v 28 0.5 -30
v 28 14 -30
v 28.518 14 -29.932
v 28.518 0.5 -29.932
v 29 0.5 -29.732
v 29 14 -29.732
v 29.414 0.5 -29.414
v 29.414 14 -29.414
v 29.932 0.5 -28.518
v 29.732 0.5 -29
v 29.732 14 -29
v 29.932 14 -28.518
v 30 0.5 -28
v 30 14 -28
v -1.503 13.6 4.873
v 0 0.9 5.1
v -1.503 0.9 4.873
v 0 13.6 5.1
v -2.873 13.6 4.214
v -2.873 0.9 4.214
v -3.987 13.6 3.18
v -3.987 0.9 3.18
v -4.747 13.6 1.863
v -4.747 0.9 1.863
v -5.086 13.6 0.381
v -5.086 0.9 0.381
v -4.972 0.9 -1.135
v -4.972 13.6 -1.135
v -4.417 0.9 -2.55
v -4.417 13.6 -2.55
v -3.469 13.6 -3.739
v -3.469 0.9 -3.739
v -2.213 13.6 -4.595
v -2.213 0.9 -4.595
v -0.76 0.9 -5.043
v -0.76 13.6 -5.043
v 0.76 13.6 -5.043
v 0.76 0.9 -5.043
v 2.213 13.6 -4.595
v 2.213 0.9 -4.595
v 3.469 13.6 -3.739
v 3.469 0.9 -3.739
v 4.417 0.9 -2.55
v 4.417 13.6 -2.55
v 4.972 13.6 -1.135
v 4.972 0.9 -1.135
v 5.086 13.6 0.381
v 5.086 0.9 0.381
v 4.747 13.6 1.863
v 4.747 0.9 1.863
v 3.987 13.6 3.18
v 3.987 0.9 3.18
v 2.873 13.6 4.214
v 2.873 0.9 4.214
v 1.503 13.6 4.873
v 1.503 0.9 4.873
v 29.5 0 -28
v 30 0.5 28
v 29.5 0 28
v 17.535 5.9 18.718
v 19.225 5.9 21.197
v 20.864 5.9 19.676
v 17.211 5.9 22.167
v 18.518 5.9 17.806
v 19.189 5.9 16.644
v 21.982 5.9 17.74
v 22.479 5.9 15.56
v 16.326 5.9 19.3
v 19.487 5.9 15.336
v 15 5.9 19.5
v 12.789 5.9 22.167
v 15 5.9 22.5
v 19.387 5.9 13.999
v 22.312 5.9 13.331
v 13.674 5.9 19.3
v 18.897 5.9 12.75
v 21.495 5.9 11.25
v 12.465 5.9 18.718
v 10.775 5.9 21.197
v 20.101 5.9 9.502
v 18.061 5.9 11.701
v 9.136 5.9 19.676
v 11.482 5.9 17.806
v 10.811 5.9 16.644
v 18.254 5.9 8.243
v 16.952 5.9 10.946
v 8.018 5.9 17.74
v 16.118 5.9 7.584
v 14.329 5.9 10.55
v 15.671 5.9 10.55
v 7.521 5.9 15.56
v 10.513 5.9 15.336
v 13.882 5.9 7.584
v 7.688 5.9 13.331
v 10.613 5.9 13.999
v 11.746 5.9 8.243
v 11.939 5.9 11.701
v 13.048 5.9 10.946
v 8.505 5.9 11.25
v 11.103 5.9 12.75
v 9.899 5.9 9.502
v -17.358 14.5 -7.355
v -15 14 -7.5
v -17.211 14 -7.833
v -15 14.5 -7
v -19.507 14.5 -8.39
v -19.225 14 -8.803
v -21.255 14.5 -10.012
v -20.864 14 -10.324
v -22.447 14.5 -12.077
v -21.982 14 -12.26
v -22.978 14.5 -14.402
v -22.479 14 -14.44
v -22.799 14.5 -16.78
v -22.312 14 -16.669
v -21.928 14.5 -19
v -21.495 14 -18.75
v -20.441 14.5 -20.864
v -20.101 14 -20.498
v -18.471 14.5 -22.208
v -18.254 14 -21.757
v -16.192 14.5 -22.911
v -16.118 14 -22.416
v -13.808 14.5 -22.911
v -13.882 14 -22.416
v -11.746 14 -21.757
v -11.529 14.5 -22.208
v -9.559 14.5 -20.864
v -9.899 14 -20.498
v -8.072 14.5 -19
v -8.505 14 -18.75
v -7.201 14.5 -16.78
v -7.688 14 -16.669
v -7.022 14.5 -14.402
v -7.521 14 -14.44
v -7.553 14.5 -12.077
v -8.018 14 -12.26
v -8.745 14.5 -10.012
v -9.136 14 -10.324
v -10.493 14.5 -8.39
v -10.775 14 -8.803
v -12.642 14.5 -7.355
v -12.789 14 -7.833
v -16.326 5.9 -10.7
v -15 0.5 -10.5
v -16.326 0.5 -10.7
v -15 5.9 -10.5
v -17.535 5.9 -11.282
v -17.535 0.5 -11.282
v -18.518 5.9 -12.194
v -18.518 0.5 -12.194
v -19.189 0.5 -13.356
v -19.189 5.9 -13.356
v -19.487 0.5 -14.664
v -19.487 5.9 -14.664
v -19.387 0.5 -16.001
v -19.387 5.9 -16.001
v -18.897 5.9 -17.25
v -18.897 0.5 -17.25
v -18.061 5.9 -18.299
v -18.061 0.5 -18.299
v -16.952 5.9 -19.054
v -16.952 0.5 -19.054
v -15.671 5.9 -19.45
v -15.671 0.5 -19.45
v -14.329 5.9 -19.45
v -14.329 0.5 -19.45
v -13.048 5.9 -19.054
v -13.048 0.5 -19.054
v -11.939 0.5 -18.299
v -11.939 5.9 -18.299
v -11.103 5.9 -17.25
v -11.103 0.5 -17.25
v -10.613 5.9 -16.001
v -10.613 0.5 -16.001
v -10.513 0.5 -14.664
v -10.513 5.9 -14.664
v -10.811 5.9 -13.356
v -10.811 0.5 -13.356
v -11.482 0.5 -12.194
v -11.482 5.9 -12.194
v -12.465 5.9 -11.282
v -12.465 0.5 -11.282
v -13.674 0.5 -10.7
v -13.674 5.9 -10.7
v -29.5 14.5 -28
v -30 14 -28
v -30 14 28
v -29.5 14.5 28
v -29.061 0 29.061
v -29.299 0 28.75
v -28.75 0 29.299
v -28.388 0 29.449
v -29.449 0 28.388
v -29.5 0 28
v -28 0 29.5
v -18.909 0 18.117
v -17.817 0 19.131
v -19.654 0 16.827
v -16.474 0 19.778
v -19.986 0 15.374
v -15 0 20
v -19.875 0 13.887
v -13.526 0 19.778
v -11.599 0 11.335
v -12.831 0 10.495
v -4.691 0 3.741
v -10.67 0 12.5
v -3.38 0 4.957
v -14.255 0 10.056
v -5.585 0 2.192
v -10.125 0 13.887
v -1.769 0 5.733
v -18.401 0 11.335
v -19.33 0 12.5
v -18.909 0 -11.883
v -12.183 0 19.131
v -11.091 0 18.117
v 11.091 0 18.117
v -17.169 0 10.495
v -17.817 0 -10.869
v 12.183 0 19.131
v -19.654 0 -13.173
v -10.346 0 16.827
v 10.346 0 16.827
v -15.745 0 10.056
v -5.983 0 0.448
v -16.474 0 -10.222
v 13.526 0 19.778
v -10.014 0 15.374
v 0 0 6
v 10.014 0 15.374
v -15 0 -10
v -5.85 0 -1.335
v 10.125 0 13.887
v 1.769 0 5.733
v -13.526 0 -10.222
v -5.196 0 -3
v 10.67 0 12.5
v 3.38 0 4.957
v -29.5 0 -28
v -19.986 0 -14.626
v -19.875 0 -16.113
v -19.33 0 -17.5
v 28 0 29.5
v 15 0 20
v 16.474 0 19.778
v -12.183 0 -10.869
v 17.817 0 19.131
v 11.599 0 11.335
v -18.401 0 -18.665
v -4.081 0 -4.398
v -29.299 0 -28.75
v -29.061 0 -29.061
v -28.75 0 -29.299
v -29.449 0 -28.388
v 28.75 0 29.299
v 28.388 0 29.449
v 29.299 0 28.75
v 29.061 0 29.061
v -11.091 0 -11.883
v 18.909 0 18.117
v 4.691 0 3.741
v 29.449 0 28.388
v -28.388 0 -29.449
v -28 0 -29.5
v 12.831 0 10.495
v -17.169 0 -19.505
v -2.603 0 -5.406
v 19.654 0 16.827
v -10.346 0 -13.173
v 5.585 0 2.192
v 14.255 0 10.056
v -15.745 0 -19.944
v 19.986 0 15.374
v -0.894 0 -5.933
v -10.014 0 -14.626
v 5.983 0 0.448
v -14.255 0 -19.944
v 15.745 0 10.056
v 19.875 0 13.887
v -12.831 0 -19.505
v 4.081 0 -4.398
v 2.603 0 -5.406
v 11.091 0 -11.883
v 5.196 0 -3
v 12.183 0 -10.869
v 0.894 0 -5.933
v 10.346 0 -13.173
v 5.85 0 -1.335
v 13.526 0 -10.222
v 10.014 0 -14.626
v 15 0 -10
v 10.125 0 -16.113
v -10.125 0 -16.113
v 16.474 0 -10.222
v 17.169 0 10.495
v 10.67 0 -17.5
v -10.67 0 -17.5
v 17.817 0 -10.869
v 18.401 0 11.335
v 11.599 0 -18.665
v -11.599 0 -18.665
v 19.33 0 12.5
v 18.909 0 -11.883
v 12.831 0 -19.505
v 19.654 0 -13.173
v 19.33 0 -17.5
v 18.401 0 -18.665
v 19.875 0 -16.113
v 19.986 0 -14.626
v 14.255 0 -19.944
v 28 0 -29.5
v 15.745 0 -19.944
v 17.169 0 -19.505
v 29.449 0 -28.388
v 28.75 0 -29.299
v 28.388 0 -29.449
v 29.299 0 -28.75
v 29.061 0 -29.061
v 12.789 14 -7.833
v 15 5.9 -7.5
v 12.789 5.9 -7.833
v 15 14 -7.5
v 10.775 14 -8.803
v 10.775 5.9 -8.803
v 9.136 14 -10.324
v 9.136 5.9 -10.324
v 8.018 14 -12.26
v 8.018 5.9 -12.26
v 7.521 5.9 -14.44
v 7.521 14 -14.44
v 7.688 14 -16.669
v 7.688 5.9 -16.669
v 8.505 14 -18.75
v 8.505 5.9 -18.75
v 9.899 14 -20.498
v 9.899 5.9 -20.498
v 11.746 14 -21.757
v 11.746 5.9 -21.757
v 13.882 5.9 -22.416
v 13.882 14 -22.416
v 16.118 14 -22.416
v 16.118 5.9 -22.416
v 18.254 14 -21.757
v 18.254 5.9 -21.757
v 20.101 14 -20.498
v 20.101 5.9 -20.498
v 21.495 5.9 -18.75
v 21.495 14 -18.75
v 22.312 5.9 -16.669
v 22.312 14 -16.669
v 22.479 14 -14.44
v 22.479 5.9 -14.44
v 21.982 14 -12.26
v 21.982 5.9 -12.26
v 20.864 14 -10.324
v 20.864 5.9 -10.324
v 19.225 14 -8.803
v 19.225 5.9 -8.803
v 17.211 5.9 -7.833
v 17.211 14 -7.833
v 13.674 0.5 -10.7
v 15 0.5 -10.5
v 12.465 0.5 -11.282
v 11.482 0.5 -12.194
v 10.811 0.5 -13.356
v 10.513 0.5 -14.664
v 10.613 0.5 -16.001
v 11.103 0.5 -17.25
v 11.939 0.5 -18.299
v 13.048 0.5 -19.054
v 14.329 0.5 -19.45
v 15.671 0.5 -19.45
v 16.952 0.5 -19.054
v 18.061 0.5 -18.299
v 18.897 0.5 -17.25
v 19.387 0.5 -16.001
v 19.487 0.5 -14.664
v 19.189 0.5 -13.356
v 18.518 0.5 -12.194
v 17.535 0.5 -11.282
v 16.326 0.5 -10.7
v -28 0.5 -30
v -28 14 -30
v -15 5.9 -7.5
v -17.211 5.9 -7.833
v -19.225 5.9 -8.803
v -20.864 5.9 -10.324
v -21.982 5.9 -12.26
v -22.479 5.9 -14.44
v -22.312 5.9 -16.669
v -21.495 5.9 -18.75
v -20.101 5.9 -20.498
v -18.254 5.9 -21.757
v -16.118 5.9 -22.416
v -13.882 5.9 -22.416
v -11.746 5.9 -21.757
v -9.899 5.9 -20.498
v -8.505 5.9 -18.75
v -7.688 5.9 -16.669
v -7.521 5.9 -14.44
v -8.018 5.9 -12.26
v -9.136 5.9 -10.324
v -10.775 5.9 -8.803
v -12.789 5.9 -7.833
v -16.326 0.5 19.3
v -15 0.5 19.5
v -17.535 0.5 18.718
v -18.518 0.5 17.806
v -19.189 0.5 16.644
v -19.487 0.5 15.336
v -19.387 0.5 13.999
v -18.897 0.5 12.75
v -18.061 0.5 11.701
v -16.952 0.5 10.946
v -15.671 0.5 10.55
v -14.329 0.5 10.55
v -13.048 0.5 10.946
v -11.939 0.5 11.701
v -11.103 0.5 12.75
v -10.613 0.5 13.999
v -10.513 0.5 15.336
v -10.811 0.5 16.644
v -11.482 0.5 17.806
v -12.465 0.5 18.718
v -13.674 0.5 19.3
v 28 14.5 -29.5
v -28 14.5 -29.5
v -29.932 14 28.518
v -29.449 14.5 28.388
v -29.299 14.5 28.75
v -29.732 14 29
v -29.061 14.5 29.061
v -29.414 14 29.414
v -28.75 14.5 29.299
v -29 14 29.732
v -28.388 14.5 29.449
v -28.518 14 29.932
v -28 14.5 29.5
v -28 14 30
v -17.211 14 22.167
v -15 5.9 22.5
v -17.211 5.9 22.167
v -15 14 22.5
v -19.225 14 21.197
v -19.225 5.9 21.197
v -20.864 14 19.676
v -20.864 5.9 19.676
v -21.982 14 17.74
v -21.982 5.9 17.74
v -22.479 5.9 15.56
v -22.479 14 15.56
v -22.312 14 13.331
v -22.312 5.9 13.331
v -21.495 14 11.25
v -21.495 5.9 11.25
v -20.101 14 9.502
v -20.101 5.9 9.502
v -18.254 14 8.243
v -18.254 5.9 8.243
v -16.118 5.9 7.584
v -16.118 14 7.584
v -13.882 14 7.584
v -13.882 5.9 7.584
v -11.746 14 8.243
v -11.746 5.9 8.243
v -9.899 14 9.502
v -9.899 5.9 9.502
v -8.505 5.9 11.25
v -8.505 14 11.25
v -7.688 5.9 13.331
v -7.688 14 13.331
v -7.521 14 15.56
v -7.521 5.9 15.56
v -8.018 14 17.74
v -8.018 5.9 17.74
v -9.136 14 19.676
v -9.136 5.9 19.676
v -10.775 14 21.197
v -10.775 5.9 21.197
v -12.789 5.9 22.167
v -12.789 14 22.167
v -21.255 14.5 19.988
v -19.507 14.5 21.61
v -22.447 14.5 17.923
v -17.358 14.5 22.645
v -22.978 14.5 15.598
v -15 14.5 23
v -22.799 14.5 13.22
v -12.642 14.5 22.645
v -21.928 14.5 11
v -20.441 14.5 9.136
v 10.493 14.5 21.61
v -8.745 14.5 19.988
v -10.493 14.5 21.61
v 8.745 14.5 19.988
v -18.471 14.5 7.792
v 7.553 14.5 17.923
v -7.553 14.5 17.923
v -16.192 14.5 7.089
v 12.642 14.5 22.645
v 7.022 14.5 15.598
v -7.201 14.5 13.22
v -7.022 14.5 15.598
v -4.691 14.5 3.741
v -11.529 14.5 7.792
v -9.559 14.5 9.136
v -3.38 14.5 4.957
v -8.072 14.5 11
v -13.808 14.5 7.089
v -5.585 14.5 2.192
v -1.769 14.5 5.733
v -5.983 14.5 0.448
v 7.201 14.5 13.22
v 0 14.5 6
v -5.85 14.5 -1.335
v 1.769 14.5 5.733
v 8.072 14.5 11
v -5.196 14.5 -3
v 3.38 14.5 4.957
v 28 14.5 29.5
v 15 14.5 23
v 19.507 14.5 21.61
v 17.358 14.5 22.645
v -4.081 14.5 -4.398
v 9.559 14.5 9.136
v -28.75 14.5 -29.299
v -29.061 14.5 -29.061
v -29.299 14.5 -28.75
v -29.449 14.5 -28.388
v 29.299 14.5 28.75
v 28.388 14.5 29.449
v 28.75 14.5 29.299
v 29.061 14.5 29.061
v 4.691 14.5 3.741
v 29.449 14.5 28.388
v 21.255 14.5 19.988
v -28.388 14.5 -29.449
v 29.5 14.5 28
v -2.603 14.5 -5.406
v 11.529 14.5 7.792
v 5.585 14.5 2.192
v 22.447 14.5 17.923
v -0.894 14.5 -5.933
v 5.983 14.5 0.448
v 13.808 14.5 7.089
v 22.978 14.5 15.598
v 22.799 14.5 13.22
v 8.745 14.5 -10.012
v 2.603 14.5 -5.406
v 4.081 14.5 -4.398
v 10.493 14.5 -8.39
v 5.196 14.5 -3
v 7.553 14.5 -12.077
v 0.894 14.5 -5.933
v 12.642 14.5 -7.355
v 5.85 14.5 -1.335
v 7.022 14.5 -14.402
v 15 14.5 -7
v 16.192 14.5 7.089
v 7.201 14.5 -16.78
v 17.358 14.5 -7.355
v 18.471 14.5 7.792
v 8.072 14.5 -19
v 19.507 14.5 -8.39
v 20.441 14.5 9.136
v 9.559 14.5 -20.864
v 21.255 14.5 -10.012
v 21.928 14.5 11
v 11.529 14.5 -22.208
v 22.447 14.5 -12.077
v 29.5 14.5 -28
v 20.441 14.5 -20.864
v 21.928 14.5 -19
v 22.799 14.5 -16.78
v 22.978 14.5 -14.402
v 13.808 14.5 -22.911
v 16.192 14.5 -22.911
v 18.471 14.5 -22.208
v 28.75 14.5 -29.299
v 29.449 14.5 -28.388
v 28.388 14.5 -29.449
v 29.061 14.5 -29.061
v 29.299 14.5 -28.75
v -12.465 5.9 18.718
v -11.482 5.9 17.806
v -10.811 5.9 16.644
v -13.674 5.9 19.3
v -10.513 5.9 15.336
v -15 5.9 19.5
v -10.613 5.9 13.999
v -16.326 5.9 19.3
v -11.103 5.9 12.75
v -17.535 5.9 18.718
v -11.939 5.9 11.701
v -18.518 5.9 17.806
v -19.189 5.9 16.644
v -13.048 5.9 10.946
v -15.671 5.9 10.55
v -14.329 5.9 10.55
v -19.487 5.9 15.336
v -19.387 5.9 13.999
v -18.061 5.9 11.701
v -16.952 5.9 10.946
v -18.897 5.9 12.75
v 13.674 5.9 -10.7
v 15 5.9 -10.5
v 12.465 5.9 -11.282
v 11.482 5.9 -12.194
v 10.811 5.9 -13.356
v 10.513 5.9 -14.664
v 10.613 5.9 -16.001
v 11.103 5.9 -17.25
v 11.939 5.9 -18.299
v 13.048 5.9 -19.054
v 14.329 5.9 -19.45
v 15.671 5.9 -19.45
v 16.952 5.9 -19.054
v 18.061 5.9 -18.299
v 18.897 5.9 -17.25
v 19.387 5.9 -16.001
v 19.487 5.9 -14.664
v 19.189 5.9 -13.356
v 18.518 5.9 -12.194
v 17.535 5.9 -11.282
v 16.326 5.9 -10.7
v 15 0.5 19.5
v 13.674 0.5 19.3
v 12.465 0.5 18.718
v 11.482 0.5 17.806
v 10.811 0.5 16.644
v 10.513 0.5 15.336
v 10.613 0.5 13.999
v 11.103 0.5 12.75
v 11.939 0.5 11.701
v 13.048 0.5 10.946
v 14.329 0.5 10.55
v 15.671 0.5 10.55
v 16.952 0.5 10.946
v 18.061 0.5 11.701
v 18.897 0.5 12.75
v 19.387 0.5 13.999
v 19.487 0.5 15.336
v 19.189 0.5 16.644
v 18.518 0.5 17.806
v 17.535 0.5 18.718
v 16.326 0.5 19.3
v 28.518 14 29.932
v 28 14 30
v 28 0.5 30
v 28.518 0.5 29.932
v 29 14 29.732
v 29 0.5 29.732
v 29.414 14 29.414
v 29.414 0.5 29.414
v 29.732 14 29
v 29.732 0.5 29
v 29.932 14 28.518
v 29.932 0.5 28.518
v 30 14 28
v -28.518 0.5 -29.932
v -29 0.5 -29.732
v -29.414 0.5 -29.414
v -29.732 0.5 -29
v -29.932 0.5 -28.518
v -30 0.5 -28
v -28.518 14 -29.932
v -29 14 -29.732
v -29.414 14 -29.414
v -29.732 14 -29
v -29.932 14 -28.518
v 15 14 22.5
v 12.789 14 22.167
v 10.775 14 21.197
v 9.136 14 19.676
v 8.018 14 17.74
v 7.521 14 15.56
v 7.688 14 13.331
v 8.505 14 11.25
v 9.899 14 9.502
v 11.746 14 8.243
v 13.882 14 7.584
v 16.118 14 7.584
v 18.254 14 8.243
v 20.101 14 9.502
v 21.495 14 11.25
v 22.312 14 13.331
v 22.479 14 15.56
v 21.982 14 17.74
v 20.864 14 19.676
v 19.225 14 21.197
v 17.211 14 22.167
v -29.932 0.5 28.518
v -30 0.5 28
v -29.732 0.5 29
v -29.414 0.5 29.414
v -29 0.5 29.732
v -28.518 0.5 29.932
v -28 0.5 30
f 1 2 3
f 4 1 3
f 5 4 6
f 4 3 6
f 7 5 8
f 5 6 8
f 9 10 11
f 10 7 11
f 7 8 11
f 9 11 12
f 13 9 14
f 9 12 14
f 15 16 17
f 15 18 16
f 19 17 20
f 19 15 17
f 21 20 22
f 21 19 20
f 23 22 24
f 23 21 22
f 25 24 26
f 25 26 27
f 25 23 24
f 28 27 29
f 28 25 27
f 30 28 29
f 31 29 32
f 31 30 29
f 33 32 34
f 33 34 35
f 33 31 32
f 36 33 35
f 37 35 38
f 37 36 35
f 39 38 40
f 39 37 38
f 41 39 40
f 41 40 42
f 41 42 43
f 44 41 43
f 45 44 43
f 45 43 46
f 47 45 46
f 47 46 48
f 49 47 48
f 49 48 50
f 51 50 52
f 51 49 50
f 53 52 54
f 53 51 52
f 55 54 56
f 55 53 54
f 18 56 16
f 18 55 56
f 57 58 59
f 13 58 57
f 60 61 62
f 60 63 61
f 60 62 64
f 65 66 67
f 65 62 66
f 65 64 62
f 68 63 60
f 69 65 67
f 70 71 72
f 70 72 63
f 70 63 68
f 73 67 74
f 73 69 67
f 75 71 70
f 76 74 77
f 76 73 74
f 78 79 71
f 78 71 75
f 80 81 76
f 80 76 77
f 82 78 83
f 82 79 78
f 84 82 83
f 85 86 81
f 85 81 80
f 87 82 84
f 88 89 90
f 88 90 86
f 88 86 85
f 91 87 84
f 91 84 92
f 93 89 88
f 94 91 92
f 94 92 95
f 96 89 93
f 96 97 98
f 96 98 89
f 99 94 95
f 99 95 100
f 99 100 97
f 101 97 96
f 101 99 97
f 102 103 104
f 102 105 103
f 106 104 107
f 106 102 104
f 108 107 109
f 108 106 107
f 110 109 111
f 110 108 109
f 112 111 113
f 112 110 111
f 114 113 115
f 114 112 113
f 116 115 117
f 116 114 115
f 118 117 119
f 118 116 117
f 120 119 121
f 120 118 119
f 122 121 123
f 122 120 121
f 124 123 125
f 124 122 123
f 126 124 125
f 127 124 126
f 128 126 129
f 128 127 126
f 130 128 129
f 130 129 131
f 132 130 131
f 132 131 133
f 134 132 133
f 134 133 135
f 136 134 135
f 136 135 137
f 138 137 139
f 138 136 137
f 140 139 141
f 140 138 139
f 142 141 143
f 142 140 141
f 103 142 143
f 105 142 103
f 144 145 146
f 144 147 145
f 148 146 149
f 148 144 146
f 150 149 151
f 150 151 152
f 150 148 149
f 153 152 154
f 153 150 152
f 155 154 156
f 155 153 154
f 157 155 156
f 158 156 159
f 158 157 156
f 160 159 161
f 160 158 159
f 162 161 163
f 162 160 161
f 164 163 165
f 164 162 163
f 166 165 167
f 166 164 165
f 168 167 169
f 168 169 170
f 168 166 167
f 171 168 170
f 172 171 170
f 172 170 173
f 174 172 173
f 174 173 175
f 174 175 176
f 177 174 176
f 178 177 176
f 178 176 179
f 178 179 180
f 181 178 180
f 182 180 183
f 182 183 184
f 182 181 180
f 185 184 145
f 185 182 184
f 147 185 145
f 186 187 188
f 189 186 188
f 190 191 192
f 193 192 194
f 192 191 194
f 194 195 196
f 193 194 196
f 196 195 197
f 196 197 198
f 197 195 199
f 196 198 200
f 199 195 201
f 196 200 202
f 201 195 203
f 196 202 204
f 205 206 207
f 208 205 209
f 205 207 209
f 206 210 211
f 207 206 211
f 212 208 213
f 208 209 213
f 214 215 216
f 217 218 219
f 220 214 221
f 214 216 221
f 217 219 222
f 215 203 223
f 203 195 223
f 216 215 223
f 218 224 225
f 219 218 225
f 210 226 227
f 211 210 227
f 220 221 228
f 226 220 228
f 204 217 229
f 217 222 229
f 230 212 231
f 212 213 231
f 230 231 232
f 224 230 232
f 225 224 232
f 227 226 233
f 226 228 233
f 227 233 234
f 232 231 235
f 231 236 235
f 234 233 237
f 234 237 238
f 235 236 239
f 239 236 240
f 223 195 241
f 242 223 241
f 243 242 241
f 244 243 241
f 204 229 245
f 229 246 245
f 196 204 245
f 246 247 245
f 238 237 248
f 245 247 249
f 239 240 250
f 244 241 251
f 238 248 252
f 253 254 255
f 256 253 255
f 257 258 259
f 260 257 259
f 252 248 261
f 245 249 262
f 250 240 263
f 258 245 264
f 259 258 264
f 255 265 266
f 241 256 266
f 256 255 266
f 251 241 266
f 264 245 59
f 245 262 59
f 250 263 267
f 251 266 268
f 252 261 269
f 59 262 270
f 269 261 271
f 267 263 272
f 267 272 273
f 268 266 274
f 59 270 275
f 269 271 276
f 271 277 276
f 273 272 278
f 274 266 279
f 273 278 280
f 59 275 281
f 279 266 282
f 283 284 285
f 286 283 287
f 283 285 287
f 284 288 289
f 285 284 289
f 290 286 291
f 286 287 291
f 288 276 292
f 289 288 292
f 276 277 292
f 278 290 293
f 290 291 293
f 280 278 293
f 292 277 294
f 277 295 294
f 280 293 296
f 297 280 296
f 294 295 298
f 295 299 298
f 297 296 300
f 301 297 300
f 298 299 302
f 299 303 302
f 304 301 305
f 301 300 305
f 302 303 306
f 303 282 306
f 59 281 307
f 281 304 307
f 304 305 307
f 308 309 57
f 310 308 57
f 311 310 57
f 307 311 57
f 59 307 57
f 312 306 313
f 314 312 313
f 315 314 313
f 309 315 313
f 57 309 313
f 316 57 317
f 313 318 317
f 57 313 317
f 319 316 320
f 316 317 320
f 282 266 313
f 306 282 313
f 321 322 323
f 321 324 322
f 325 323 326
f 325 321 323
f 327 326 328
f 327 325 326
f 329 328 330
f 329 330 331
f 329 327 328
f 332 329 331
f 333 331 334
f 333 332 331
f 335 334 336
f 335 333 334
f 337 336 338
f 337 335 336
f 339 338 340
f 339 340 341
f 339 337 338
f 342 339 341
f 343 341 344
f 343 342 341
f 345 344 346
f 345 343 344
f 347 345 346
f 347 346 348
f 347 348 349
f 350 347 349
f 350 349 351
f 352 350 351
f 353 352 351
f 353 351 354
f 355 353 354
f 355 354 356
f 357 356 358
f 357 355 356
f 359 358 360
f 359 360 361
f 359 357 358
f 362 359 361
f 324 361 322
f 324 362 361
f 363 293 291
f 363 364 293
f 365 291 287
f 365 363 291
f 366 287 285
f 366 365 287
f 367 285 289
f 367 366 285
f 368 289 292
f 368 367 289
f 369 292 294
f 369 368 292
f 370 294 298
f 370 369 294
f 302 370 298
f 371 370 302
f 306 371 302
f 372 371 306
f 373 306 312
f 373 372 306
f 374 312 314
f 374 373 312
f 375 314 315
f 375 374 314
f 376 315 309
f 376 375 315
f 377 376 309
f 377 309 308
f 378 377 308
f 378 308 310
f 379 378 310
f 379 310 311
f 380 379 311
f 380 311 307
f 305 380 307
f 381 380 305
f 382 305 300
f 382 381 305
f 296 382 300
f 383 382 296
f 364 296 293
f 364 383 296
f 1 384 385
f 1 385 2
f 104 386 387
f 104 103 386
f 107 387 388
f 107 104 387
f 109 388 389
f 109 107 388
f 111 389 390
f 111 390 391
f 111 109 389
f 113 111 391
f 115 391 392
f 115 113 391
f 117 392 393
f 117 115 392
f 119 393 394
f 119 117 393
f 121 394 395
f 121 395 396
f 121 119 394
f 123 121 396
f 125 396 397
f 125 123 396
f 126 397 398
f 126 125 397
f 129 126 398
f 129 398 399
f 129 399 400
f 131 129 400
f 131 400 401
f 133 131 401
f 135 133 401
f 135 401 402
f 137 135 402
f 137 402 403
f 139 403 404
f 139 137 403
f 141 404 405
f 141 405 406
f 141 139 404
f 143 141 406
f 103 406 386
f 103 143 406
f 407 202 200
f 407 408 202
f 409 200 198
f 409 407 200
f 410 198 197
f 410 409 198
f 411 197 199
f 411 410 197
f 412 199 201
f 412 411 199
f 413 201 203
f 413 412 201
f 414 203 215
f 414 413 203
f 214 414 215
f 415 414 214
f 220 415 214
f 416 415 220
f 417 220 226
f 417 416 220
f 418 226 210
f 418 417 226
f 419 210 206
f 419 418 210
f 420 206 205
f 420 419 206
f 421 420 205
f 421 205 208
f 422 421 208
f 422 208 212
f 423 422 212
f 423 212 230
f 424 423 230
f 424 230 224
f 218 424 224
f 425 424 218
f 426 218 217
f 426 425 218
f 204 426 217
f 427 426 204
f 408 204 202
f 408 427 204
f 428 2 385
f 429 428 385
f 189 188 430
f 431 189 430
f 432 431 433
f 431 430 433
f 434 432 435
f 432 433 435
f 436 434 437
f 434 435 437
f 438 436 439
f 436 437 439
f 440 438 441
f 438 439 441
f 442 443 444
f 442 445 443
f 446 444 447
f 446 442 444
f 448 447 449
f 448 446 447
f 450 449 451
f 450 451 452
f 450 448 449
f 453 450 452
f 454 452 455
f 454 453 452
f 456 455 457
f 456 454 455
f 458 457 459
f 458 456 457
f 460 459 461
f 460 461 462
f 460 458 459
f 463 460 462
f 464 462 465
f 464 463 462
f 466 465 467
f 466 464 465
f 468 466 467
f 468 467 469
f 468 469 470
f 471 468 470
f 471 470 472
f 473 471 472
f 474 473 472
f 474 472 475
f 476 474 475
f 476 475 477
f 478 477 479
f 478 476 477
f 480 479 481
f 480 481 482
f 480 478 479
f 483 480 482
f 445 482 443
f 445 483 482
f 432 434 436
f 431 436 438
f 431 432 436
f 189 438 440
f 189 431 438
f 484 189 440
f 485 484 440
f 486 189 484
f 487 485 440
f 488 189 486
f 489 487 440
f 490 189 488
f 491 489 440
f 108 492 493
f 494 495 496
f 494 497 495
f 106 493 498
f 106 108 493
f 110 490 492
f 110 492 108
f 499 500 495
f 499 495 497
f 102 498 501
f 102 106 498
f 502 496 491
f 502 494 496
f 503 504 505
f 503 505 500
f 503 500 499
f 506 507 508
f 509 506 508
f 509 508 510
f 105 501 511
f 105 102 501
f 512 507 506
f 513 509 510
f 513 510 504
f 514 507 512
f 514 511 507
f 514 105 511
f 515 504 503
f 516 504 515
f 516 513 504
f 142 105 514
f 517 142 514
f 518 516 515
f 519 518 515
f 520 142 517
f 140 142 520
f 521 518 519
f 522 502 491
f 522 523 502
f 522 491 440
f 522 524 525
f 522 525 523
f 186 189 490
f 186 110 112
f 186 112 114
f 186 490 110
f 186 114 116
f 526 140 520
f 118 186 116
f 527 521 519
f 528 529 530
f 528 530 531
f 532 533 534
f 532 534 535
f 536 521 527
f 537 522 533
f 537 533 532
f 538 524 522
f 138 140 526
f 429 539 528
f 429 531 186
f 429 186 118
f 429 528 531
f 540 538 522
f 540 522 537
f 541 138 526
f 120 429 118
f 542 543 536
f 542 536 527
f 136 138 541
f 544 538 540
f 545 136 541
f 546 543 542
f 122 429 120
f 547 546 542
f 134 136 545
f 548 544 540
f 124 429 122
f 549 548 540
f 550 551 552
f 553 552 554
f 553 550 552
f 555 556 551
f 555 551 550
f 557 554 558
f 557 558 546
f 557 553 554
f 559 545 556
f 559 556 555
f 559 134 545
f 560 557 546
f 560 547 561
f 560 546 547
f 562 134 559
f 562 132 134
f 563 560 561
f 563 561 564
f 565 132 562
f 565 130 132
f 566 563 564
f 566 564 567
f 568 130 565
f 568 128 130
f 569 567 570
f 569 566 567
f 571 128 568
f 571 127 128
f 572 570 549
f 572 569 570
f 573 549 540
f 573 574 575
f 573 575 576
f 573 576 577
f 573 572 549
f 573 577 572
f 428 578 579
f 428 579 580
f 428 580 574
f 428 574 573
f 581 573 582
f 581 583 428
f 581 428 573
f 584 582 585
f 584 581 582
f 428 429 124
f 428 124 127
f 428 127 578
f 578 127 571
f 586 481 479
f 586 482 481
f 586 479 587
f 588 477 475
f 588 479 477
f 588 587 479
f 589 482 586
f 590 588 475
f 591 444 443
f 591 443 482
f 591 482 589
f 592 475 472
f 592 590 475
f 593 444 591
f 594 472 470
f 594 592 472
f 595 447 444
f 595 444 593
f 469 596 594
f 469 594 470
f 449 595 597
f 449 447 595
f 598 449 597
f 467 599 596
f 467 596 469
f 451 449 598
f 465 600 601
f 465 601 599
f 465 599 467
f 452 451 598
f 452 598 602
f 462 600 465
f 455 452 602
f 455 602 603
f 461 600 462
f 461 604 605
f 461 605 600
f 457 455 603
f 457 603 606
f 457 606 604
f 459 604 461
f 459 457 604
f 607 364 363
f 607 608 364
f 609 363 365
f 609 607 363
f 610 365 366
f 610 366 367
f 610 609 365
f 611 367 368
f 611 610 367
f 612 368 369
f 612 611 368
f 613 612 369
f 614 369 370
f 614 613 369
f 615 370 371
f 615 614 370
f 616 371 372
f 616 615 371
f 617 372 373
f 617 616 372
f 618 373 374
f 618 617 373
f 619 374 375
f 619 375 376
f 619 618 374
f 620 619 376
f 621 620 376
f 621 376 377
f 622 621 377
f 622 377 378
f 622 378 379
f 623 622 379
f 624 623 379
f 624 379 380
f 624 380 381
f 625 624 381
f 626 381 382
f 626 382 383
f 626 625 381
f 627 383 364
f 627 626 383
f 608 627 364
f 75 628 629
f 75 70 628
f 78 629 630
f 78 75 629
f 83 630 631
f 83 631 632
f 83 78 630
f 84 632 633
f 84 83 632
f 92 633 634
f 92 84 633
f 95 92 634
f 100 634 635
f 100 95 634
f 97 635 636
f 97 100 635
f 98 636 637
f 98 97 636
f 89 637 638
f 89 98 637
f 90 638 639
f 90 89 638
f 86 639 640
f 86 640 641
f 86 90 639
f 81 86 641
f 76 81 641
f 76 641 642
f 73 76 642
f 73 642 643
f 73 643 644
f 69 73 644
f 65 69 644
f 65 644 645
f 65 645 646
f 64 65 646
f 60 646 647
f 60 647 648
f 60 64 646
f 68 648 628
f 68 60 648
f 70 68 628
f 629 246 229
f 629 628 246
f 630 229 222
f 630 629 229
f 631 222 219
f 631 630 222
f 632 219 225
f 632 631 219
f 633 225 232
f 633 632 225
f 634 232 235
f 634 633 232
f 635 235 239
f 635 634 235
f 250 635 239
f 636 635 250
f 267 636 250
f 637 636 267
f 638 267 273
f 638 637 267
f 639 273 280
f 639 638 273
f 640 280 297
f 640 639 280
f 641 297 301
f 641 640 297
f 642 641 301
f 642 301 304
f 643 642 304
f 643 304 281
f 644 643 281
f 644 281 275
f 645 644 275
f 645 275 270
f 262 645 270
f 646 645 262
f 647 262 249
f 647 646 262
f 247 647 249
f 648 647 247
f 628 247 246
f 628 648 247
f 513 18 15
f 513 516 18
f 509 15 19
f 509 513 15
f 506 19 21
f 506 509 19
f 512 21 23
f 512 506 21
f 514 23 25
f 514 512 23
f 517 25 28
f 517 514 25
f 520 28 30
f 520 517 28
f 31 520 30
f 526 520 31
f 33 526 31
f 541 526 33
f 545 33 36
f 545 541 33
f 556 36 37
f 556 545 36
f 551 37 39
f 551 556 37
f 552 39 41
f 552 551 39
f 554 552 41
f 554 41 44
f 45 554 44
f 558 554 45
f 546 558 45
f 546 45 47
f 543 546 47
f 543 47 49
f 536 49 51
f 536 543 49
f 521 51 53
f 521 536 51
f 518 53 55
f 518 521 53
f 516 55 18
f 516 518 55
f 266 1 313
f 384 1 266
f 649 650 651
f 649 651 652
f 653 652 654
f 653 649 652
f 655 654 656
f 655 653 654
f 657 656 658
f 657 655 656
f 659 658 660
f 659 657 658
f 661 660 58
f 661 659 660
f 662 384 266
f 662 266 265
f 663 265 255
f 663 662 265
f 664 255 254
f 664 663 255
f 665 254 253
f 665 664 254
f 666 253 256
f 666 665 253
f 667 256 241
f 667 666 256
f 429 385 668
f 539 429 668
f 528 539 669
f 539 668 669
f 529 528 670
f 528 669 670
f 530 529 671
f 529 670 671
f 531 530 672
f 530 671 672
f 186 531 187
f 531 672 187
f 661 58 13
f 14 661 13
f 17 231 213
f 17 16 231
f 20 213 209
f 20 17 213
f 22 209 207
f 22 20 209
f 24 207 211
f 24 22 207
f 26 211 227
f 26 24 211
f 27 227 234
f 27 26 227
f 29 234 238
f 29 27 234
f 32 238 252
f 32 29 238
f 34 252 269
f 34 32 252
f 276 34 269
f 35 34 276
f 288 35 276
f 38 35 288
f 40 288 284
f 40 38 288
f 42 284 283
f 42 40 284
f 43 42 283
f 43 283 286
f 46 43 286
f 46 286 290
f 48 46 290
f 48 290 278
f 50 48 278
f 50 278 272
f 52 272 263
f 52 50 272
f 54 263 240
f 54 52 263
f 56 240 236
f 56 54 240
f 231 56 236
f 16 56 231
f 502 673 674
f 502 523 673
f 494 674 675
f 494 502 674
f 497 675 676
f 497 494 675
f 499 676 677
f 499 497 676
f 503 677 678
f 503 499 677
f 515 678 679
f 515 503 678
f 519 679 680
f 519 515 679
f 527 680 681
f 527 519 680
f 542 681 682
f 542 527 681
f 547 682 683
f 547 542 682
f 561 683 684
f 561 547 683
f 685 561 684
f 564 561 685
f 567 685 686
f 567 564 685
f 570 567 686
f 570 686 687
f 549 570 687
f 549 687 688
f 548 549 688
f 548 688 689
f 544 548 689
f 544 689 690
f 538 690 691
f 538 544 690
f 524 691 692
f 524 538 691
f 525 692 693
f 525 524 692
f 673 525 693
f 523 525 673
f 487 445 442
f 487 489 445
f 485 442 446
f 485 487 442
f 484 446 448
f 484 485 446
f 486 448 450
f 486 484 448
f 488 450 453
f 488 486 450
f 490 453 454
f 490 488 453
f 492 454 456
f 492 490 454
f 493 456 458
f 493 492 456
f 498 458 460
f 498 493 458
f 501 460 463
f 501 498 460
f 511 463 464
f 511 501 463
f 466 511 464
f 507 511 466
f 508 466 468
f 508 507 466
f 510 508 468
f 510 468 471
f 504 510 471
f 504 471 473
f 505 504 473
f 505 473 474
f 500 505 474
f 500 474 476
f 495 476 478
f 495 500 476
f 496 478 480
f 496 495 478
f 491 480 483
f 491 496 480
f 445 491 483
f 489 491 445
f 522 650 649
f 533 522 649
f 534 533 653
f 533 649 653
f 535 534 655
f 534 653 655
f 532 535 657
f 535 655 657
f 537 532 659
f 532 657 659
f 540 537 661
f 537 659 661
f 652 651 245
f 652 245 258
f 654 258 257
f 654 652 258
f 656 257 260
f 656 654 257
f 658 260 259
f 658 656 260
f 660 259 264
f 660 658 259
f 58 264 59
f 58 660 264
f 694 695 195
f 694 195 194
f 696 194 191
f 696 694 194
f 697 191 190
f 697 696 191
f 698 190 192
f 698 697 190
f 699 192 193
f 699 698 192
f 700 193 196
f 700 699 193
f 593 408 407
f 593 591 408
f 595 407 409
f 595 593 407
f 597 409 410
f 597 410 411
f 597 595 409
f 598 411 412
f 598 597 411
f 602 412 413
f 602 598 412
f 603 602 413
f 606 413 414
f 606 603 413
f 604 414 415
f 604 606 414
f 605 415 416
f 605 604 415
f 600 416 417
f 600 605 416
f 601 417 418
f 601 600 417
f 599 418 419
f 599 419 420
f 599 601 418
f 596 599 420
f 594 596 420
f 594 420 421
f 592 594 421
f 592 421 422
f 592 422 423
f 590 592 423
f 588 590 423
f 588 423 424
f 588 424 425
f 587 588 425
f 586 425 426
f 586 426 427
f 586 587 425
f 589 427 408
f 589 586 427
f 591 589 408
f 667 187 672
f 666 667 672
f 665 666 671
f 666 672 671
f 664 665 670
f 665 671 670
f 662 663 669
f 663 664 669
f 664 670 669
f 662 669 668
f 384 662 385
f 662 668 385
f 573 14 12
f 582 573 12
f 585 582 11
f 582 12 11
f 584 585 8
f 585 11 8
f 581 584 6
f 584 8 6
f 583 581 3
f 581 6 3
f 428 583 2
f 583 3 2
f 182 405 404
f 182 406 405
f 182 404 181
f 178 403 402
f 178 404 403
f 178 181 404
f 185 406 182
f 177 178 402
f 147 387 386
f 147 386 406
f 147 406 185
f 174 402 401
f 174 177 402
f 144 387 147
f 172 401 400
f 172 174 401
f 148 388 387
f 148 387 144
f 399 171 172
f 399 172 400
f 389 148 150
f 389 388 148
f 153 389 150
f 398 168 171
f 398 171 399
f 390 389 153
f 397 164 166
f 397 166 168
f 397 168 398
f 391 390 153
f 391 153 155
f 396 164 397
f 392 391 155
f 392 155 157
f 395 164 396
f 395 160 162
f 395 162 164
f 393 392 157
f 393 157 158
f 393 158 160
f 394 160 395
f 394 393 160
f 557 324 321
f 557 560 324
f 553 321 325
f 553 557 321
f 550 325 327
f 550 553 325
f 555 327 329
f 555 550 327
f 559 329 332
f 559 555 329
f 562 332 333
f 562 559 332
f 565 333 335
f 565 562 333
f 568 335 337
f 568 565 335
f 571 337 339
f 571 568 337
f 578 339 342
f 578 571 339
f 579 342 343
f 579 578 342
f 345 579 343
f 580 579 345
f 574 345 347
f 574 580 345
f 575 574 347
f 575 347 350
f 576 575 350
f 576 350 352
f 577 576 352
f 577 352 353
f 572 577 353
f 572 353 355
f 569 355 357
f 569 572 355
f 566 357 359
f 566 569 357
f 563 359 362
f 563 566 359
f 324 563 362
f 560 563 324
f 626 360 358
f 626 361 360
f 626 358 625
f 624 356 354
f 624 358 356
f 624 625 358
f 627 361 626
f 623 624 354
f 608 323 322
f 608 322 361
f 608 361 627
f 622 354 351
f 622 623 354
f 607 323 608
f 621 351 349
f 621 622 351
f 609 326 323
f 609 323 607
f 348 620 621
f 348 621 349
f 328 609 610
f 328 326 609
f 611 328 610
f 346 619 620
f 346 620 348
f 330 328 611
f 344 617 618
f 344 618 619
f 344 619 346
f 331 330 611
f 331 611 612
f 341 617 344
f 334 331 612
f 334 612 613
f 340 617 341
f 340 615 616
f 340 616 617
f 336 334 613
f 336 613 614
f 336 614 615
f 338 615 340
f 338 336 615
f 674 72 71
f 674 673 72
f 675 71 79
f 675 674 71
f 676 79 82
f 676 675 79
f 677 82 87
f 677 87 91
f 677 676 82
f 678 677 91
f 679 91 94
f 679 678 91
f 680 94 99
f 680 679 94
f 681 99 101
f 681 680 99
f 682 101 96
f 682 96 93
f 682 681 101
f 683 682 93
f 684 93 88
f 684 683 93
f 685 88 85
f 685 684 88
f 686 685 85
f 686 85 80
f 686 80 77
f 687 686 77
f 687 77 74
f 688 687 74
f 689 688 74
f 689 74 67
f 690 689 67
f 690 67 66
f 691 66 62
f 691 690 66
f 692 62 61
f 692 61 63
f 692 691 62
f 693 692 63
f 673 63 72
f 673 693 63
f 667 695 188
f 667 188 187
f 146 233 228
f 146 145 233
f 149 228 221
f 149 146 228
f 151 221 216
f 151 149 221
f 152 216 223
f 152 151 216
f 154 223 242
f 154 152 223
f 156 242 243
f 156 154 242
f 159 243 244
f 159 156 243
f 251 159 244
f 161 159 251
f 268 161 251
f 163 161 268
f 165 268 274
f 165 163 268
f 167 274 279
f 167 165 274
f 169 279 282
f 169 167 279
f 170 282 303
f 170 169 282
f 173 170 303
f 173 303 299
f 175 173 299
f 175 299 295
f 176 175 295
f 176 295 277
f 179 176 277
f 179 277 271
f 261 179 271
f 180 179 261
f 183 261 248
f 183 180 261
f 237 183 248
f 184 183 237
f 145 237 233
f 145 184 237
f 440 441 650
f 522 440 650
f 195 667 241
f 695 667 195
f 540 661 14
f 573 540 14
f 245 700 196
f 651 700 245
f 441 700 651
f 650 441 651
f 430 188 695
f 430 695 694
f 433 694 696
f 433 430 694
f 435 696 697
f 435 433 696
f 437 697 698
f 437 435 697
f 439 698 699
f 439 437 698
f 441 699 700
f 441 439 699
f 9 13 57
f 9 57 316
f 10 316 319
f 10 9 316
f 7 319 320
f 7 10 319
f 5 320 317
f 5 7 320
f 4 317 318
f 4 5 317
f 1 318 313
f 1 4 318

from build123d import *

# Parameters (mm, degrees)
SKETCH1_W                                    = 60
SKETCH1_H                                    = 60
BOSS_EXTRUDE1_DEPTH                          = 14.5
CBORE_FOR_M8_HEX_SOCKET_HEAD_CAP_SCR_2_COUNT = 2
CBORE_FOR_M8_HEX_SOCKET_HEAD_CAP_SCR_2_PITCH = 30
CBORE_FOR_M8_HEX_SOCKET_HEAD_CAP_SCR_3_COUNT = 2
CBORE_FOR_M8_HEX_SOCKET_HEAD_CAP_SCR_3_PITCH = 42.426406871
CBORE_FOR_M8_HEX_SOCKET_HEAD_CAP_SCR_4_COUNT = 2
CBORE_FOR_M8_HEX_SOCKET_HEAD_CAP_SCR_4_PITCH = 30
FILLET1_R                                    = 2
CHAMFER1_SIZE                                = 0.5


with BuildPart() as part:
    # Sketch1 → Boss-Extrude1 (new body)
    with BuildSketch(Plane(origin=(0, 0, 0), x_dir=(1, 0, 0), z_dir=(0, 1, 0))):
        Rectangle(SKETCH1_W, SKETCH1_H)
    extrude(amount=BOSS_EXTRUDE1_DEPTH)

    # Sketch4 → CBORE for M8 Hex Socket Head Cap Screw1 (revolve, cut)
    with BuildSketch(Plane(origin=(-15, 14.5, 15), x_dir=(0, 0, 1), z_dir=(1, 0, 0))):
        Polygon((0, 0), (0, 14.5), (5, 14.5), (4.5, 14), (4.5, 8.6), (7.5, 8.6), (7.5, 0.5), (8, 0), align=None)
    cbore_for_m8_hex_socket_head_cap_screw1 = revolve(axis=Axis((-15, 20.85, 15), (0, -1, 0)), mode=Mode.SUBTRACT)

    # CBORE for M8 Hex Socket Head Cap Scr 2: CBORE for M8 Hex Socket Head Cap Screw1 ×2
    with Locations(*[(i * CBORE_FOR_M8_HEX_SOCKET_HEAD_CAP_SCR_2_PITCH, 0, 0) for i in range(1, CBORE_FOR_M8_HEX_SOCKET_HEAD_CAP_SCR_2_COUNT)]):
        add(cbore_for_m8_hex_socket_head_cap_screw1, mode=Mode.SUBTRACT)

    # CBORE for M8 Hex Socket Head Cap Scr 3: CBORE for M8 Hex Socket Head Cap Screw1 ×2
    with Locations(*[Vector(0.7071067811865476, 0, -0.7071067811865476) * (i * CBORE_FOR_M8_HEX_SOCKET_HEAD_CAP_SCR_3_PITCH) for i in range(1, CBORE_FOR_M8_HEX_SOCKET_HEAD_CAP_SCR_3_COUNT)]):
        add(cbore_for_m8_hex_socket_head_cap_screw1, mode=Mode.SUBTRACT)

    # CBORE for M8 Hex Socket Head Cap Scr 4: CBORE for M8 Hex Socket Head Cap Screw1 ×2
    with Locations(*[(0, 0, -i * CBORE_FOR_M8_HEX_SOCKET_HEAD_CAP_SCR_4_PITCH) for i in range(1, CBORE_FOR_M8_HEX_SOCKET_HEAD_CAP_SCR_4_COUNT)]):
        add(cbore_for_m8_hex_socket_head_cap_screw1, mode=Mode.SUBTRACT)

    # Sketch7 → M12 Tapped Hole1 (revolve, cut)
    with BuildSketch(Plane(origin=(0, 14.5, 0), x_dir=(0, 0, 1), z_dir=(1, 0, 0))):
        Polygon((0, 0), (0, 14.5), (6, 14.5), (5.1, 13.6), (5.1, 0.9), (6, 0), align=None)
    revolve(axis=Axis((0, 20.85, 0), (0, -1, 0)), mode=Mode.SUBTRACT)

    # Fillet1
    fillet1_edges = [part.edges().sort_by_distance(p)[0] for p in [
        (-30, 7.25, -30),
        (30, 7.25, -30),
        (30, 7.25, 30),
        (-30, 7.25, 30),
    ]]
    fillet(fillet1_edges, radius=FILLET1_R)

    # Chamfer1
    chamfer1_edges = [part.edges().sort_by_distance(p)[0] for p in [
        (0, 0, 30),
        (0, 14.5, 30),
        (-30, 0, 0),
        (0, 0, -30),
        (30, 0, 0),
        (-29.414213562, 0, -29.414213562),
        (29.414213562, 0, -29.414213562),
        (29.414213562, 0, 29.414213562),
        (-29.414213562, 0, 29.414213562),
        (-30, 14.5, 0),
        (30, 14.5, 0),
        (0, 14.5, -30),
        (-29.414213562, 14.5, -29.414213562),
        (29.414213562, 14.5, -29.414213562),
        (29.414213562, 14.5, 29.414213562),
        (-29.414213562, 14.5, 29.414213562),
    ]]
    chamfer(chamfer1_edges, length=CHAMFER1_SIZE)


solid = part.part
